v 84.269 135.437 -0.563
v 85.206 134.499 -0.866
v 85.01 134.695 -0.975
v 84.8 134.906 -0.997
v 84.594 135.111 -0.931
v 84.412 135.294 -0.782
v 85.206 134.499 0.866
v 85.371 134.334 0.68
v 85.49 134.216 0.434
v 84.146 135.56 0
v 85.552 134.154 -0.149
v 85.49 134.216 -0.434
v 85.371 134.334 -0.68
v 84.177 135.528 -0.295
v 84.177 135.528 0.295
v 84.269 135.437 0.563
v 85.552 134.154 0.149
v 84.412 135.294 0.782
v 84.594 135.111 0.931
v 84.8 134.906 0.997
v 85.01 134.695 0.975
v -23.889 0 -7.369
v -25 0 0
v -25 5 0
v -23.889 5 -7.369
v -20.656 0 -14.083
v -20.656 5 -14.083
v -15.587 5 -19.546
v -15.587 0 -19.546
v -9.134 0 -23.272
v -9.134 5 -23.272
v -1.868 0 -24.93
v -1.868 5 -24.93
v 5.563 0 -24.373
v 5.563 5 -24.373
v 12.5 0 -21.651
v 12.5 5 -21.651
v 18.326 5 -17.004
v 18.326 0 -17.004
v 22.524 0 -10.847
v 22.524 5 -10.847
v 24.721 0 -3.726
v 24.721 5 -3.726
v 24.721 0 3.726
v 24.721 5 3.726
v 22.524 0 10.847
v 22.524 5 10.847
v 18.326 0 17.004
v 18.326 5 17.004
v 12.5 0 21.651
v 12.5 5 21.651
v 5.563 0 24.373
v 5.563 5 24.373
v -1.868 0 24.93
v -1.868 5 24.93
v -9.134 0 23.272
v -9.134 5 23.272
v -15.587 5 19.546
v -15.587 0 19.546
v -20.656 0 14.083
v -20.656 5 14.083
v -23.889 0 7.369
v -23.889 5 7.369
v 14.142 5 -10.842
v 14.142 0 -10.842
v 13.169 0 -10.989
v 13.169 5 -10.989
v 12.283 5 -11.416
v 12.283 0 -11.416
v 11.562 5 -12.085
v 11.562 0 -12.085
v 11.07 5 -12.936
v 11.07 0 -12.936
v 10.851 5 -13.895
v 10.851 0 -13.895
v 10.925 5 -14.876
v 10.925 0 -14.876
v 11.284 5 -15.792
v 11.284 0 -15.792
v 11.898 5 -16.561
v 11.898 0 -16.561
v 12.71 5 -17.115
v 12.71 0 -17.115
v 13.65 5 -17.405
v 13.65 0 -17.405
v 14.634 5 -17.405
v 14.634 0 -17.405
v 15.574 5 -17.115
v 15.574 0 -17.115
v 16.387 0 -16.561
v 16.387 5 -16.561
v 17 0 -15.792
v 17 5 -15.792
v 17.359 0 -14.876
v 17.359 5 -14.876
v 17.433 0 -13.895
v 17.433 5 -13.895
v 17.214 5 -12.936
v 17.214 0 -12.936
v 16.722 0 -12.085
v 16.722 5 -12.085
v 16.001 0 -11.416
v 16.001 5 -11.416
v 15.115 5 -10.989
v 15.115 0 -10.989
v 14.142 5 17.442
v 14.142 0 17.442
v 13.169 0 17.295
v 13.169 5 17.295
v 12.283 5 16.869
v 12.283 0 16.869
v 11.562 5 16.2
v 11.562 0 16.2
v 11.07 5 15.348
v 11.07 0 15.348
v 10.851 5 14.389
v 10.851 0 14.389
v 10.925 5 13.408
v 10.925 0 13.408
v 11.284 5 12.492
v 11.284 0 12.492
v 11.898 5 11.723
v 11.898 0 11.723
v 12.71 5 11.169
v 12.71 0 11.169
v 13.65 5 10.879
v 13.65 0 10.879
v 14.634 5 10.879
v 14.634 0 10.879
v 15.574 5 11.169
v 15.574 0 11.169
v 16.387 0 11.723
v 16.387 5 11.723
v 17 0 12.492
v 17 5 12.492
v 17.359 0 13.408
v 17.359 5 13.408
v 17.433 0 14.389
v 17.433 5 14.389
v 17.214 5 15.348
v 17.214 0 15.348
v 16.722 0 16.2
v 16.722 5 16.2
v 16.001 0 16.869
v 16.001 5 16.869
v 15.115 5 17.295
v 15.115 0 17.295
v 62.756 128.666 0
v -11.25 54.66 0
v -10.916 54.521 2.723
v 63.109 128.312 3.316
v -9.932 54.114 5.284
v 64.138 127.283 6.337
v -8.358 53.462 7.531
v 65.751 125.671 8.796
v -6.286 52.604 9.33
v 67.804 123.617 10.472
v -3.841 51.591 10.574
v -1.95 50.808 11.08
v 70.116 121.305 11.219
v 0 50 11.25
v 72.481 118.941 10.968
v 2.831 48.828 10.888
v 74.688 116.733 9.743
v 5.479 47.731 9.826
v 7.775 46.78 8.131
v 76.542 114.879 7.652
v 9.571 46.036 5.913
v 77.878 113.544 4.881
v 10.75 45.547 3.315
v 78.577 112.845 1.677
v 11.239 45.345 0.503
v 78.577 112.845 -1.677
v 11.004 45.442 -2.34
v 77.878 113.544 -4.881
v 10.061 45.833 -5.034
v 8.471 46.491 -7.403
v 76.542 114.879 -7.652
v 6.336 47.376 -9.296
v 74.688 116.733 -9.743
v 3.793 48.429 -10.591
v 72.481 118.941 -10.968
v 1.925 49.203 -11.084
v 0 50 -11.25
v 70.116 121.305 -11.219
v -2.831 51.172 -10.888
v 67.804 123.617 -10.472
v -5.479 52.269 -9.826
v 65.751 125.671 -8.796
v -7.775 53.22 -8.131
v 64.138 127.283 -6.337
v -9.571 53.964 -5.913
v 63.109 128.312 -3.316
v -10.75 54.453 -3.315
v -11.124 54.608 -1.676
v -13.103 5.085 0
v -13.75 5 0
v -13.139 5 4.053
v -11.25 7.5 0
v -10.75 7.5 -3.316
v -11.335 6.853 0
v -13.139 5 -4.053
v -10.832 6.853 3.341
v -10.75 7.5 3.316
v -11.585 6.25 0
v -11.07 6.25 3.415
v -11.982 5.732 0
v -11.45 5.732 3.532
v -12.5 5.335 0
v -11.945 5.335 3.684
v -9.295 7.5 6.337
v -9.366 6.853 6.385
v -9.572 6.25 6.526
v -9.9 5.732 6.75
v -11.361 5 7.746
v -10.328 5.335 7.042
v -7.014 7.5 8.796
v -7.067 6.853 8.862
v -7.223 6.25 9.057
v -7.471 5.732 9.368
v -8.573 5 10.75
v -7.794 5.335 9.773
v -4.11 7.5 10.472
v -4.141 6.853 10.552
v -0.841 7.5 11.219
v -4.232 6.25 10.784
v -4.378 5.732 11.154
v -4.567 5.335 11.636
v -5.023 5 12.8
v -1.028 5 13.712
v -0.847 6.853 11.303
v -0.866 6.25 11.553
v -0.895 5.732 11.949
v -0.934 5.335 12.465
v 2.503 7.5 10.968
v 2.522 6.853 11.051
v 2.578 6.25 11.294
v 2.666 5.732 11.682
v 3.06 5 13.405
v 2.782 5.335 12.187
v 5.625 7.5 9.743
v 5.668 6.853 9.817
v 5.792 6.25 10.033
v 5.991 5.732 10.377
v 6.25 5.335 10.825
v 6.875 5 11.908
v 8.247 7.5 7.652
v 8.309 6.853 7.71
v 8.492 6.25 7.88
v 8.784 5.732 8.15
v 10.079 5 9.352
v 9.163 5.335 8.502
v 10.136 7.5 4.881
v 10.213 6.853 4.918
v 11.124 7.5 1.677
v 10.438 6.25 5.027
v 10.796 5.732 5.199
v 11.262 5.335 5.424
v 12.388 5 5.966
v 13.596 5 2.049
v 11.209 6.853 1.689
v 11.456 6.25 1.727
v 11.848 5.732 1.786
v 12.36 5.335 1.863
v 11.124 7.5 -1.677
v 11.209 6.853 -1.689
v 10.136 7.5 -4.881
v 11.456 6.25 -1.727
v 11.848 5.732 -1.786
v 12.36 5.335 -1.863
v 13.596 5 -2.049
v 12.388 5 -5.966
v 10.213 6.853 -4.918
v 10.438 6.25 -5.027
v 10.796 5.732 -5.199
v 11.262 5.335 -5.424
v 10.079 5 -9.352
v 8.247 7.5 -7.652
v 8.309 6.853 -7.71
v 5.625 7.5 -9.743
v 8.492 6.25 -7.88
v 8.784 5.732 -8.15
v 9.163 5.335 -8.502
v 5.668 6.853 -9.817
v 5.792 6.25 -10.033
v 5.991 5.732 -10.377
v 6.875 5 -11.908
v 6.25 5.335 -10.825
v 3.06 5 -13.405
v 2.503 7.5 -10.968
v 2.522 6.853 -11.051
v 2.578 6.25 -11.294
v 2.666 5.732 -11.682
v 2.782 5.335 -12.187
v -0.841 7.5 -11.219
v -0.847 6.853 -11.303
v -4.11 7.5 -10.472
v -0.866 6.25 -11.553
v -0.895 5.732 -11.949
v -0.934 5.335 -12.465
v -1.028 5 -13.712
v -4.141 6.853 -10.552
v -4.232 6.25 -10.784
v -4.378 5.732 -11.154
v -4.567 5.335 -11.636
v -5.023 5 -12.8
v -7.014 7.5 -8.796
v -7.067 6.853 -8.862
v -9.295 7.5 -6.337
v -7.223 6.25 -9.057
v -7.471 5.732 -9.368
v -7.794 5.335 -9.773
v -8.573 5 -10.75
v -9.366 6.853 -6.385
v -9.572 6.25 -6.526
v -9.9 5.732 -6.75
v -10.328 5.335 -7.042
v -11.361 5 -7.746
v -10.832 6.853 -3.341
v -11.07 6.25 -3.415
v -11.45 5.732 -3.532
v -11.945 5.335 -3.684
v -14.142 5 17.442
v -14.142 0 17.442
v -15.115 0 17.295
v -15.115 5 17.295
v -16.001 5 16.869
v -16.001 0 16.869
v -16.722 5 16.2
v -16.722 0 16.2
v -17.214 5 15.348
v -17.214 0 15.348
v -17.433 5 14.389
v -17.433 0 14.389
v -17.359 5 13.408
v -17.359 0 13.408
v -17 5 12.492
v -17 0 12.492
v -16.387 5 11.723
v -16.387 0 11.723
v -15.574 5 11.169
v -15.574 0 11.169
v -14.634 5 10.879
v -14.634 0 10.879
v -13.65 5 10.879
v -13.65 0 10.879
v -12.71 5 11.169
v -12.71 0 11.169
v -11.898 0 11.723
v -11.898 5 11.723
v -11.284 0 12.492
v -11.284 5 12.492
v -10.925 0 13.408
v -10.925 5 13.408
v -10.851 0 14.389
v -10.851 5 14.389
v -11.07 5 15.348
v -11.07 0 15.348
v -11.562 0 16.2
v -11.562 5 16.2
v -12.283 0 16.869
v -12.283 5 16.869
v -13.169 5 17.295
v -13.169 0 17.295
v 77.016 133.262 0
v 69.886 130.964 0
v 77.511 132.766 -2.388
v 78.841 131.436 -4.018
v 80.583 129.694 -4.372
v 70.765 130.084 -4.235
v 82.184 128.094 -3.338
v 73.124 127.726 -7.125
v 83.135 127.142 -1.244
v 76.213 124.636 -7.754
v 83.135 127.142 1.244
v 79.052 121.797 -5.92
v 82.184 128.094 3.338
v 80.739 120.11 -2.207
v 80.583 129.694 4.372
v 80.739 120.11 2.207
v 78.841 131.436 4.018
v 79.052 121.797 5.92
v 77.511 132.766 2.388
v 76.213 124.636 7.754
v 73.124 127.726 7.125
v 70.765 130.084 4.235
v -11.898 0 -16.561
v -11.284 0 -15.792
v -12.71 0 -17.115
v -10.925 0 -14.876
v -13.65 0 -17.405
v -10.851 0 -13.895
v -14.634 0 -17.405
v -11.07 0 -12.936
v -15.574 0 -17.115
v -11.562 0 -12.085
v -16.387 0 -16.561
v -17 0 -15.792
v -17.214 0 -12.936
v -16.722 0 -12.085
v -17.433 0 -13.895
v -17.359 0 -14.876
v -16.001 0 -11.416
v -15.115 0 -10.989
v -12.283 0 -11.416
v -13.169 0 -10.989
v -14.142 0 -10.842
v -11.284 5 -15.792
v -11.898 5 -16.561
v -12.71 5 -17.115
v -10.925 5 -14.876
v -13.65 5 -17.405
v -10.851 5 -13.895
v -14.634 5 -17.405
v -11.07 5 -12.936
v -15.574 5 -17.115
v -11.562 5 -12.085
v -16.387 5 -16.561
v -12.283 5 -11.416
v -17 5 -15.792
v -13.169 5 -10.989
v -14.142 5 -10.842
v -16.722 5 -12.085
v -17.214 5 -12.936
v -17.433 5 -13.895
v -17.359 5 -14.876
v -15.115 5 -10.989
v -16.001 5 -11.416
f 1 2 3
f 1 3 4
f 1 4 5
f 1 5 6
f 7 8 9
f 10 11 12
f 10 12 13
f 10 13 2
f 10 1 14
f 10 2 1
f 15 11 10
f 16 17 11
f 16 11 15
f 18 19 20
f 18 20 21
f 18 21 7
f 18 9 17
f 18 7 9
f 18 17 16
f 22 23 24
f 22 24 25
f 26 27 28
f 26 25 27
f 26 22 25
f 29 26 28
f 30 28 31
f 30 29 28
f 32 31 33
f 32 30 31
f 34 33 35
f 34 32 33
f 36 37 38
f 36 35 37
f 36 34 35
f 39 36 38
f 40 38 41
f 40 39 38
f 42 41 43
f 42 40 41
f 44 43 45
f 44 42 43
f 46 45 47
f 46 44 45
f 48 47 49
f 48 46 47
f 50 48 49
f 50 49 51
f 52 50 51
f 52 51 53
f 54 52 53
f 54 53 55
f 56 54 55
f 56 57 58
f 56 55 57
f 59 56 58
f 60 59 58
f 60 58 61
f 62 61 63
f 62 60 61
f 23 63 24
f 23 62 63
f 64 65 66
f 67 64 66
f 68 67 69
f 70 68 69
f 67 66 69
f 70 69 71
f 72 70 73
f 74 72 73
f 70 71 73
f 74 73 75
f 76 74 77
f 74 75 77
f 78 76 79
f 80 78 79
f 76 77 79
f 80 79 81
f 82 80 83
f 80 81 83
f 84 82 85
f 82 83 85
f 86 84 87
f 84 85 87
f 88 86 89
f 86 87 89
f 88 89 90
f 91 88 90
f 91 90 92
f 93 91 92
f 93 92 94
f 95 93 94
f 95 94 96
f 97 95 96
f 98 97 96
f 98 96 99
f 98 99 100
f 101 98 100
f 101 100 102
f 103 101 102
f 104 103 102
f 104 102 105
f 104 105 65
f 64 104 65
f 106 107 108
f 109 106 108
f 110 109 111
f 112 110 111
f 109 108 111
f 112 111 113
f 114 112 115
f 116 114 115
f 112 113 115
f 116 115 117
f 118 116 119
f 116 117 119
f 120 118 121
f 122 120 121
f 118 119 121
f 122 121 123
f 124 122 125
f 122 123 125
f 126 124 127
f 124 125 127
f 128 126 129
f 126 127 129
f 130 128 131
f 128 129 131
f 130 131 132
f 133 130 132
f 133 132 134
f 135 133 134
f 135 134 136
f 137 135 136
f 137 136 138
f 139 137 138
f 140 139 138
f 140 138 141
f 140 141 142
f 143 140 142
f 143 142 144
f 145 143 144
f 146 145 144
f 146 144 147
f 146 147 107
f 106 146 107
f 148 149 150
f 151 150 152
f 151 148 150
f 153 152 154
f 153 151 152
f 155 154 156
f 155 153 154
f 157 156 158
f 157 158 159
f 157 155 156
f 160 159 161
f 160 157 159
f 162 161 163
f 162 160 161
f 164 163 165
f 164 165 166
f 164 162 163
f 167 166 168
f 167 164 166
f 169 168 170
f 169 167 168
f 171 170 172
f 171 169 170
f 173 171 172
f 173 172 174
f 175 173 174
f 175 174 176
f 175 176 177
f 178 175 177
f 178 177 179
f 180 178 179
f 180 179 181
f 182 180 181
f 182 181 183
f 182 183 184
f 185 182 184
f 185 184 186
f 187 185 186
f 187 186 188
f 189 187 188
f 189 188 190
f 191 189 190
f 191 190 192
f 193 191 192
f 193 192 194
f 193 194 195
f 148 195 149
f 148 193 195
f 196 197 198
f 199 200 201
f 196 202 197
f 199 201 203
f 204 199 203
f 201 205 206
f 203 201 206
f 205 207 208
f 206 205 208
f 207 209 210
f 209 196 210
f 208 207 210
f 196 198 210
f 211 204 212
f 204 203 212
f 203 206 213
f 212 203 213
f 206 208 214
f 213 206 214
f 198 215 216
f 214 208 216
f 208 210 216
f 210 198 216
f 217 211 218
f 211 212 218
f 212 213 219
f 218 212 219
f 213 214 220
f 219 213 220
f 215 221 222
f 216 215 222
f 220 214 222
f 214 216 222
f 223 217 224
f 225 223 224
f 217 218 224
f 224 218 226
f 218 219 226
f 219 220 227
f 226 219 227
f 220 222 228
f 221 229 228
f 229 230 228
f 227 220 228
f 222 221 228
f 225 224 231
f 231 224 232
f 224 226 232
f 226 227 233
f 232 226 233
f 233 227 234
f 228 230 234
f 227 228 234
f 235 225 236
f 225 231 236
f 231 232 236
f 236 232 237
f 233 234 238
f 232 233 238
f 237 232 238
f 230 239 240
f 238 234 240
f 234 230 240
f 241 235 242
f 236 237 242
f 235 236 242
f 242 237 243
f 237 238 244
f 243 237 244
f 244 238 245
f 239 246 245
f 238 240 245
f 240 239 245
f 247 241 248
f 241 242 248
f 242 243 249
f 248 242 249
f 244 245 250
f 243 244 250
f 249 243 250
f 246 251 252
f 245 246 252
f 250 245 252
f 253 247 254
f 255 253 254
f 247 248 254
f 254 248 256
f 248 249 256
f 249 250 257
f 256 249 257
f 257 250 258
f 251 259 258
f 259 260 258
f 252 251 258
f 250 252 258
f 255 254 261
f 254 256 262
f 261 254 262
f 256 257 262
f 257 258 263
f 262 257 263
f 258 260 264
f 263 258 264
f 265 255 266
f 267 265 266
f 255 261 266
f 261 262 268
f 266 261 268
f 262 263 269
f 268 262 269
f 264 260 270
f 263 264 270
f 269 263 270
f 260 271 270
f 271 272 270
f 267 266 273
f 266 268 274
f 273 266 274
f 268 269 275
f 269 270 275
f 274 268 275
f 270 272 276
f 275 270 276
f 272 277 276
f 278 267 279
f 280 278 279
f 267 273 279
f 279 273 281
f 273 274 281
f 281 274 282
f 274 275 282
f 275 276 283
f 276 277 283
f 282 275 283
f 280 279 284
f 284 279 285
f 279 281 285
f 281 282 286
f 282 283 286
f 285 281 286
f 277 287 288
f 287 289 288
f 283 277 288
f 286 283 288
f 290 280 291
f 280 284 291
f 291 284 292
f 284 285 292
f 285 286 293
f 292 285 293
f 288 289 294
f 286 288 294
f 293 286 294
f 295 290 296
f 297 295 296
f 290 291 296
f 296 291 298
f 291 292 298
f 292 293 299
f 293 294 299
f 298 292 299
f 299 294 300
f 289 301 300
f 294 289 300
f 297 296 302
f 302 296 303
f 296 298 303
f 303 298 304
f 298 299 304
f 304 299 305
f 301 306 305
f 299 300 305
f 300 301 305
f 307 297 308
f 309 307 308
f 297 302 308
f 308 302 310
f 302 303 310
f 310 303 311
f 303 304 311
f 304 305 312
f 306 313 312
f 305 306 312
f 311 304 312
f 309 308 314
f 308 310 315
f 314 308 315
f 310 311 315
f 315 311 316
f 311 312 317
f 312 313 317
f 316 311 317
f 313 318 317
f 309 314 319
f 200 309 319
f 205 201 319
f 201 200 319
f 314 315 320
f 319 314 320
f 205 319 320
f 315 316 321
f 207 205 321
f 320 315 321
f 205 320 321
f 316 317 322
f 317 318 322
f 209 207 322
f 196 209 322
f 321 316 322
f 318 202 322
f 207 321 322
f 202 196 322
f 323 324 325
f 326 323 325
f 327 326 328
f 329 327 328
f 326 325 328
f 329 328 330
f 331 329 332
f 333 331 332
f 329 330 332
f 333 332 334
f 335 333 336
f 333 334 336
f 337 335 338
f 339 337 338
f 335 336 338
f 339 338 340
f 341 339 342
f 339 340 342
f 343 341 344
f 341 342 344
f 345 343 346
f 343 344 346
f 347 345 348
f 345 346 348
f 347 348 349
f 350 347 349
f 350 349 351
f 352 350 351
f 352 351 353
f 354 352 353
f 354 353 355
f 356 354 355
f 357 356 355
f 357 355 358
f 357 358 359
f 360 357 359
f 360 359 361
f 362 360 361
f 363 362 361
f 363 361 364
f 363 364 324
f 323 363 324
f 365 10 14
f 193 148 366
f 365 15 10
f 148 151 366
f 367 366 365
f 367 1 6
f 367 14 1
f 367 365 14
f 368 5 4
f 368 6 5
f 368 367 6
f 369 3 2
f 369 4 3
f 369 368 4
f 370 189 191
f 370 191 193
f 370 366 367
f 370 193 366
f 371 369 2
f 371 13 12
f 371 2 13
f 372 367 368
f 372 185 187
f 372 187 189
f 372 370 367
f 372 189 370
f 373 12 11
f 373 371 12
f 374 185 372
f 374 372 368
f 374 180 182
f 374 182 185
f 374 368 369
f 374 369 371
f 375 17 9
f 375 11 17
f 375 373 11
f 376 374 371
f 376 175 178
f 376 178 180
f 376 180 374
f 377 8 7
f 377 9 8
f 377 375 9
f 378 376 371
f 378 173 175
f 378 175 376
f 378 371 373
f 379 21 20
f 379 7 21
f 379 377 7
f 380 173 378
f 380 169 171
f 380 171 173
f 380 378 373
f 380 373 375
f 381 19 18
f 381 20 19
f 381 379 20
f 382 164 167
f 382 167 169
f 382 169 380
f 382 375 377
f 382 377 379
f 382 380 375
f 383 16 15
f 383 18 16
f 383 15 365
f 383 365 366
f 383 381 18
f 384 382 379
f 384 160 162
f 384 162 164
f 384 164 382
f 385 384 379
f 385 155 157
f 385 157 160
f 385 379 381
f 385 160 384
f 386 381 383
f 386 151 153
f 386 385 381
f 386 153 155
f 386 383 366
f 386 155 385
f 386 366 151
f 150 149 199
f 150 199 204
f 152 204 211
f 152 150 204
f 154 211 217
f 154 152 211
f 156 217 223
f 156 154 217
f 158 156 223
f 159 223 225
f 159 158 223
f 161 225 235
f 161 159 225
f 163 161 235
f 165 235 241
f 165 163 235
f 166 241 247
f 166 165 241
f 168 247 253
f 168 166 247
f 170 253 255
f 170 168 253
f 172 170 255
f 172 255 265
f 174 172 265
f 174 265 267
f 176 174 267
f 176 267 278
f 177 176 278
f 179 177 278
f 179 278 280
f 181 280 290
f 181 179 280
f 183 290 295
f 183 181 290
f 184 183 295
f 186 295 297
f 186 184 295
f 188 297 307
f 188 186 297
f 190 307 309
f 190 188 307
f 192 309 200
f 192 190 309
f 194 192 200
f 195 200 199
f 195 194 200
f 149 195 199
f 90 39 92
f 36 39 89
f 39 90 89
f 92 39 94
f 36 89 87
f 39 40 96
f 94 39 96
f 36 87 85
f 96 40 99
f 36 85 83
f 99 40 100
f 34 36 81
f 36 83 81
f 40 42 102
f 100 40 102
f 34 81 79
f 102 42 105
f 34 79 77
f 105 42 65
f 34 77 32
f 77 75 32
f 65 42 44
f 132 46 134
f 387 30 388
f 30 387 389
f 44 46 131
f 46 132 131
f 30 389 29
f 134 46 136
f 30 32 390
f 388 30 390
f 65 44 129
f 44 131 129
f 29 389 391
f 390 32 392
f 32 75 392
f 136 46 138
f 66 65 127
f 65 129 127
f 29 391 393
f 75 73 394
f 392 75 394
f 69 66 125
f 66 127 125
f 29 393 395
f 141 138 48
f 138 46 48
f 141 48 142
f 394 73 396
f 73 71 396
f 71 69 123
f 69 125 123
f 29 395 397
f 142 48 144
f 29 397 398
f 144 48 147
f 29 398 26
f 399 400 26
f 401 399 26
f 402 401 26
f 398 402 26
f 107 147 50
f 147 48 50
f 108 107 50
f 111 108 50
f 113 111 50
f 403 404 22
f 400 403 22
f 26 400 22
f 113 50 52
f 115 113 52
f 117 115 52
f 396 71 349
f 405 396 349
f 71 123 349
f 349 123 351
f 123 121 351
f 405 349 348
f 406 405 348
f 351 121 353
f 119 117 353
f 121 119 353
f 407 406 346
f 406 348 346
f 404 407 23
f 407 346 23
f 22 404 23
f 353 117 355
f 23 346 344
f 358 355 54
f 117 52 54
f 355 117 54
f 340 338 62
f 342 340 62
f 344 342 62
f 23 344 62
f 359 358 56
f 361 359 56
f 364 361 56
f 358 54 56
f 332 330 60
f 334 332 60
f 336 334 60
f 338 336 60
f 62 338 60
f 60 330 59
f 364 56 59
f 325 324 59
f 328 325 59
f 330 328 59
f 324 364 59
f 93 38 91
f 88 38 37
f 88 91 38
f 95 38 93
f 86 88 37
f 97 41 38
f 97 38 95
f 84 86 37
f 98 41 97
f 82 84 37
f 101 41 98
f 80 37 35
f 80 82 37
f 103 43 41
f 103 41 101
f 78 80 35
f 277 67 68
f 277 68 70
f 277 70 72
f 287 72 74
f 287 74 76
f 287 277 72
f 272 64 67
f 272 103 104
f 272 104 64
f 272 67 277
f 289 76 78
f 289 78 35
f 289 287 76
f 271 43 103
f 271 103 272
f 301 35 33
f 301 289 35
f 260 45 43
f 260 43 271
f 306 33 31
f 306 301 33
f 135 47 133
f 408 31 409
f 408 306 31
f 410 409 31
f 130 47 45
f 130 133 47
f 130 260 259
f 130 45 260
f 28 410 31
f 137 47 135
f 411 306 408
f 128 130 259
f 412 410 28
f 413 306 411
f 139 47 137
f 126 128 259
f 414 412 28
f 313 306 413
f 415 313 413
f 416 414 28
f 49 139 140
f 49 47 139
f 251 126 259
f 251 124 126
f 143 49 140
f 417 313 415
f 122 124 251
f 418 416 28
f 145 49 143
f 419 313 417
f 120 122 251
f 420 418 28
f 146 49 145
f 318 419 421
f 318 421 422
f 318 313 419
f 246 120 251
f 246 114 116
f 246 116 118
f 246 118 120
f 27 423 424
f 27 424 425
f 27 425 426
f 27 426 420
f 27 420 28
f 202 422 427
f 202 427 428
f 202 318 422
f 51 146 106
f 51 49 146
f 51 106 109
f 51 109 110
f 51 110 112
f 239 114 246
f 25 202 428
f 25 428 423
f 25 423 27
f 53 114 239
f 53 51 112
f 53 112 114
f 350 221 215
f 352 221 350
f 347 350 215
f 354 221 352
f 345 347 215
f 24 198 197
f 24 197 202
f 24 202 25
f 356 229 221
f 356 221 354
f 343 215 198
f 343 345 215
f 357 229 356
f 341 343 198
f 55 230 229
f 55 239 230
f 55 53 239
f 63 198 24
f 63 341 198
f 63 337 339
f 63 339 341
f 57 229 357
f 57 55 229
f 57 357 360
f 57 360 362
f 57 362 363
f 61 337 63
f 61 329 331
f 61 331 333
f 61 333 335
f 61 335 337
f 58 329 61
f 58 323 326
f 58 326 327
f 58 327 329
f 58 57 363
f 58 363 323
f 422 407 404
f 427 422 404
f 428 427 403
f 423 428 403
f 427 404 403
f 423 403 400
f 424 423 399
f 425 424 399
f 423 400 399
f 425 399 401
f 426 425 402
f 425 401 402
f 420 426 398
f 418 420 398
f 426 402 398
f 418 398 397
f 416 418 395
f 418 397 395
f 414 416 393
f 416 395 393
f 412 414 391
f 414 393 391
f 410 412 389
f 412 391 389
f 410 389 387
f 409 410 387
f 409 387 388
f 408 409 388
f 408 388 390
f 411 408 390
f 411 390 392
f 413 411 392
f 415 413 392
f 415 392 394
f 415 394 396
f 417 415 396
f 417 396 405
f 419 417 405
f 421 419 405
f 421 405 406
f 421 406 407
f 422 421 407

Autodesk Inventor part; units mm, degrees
ref_plane "YZ Plane" through (0, 0, 0) normal (1, 0, 0) x (0, 1, 0)
ref_plane "XZ Plane" through (0, 0, 0) normal (0, 1, 0) x (-1, 0, 0)
sketch "Sketch1" plane through (0, 0, 0) normal (0, 0, 1) x (1, 0, 0)
  line L0 (0, 0) -> (0, 50)
  line L1 (0, 50) -> (70.7107, 120.7107)
  line L2 (0, 50) -> (30.994, 50) construction
  line L3 (70.7107, 120.7107) -> (84.8528, 134.8528) construction
  dimension "d0" = 50
  dimension "d1" = 100
  dimension "d2" = 45
  dimension "d24" = 120
sketch "Sketch2" plane through (0, 0, 0) normal (0, 1, 0) x (-1, 0, 0)
  circle A0 centre (0, 0) radius 11.25
  circle A1 centre (0, 0) radius 8.75 construction
  dimension "d6" = 17.5
  dimension "d7" = 2.5
  dimension "d27" = 22.5
sweep "Sweep1" add profiles "Sketch2" path "Sketch1"
sketch "Sketch3" plane through (0, 0, 0) normal (0, 1, 0) x (-1, 0, 0)
  circle A0 centre (0, 0) radius 11.25 projected
  circle A1 centre (0, 0) radius 20 construction
  circle A2 centre (0, 0) radius 25
  dimension "d8" = 40
  dimension "d9" = 5
  dimension "d10" = 50
extrude "Extrusion1" add sketch "Sketch3" along normal blind 5
sketch "Sketch4" plane through (0, 5, 0) normal (0, 1, 0) x (1, 0, 0)
  circle A0 centre (0, 0) radius 20 construction
  point P0 (-14.1421, 14.1421)
  point P1 (-14.1421, -14.1421)
  point P2 (14.1421, -14.1421)
  point P3 (14.1421, 14.1421)
hole "Hole1" at (-14.1421, 5, -14.1421) at (14.1421, 5, -14.1421) at (-14.1421, 5, 14.1421) at (14.1421, 5, 14.1421) direction (0, -1, 0) diameter 6.6 end through all
fillet "Fillet1" radius 2.5 1 edges at (11.25, 5, 0)
ref_plane "Work Plane1" through (84.8528, 134.8528, 0) normal (0.7071068, 0.7071068, 0) x (-0.7071068, 0.7071068, 0)
sketch "Sketch8" plane through (84.8528, 134.8528, 0) normal (0.7071068, 0.7071068, 0) x (-0.7071068, 0.7071068, 0)
  circle A0 centre (0, 0) radius 1
  point P0 (-35.3553, 0)
  dimension "d34" = 2
loft "Loft2" add profiles "Sketch8" section 1 edges at (78.6656, 112.7557, 0)
properties part number "Herramienta1-2" material "PLA"
